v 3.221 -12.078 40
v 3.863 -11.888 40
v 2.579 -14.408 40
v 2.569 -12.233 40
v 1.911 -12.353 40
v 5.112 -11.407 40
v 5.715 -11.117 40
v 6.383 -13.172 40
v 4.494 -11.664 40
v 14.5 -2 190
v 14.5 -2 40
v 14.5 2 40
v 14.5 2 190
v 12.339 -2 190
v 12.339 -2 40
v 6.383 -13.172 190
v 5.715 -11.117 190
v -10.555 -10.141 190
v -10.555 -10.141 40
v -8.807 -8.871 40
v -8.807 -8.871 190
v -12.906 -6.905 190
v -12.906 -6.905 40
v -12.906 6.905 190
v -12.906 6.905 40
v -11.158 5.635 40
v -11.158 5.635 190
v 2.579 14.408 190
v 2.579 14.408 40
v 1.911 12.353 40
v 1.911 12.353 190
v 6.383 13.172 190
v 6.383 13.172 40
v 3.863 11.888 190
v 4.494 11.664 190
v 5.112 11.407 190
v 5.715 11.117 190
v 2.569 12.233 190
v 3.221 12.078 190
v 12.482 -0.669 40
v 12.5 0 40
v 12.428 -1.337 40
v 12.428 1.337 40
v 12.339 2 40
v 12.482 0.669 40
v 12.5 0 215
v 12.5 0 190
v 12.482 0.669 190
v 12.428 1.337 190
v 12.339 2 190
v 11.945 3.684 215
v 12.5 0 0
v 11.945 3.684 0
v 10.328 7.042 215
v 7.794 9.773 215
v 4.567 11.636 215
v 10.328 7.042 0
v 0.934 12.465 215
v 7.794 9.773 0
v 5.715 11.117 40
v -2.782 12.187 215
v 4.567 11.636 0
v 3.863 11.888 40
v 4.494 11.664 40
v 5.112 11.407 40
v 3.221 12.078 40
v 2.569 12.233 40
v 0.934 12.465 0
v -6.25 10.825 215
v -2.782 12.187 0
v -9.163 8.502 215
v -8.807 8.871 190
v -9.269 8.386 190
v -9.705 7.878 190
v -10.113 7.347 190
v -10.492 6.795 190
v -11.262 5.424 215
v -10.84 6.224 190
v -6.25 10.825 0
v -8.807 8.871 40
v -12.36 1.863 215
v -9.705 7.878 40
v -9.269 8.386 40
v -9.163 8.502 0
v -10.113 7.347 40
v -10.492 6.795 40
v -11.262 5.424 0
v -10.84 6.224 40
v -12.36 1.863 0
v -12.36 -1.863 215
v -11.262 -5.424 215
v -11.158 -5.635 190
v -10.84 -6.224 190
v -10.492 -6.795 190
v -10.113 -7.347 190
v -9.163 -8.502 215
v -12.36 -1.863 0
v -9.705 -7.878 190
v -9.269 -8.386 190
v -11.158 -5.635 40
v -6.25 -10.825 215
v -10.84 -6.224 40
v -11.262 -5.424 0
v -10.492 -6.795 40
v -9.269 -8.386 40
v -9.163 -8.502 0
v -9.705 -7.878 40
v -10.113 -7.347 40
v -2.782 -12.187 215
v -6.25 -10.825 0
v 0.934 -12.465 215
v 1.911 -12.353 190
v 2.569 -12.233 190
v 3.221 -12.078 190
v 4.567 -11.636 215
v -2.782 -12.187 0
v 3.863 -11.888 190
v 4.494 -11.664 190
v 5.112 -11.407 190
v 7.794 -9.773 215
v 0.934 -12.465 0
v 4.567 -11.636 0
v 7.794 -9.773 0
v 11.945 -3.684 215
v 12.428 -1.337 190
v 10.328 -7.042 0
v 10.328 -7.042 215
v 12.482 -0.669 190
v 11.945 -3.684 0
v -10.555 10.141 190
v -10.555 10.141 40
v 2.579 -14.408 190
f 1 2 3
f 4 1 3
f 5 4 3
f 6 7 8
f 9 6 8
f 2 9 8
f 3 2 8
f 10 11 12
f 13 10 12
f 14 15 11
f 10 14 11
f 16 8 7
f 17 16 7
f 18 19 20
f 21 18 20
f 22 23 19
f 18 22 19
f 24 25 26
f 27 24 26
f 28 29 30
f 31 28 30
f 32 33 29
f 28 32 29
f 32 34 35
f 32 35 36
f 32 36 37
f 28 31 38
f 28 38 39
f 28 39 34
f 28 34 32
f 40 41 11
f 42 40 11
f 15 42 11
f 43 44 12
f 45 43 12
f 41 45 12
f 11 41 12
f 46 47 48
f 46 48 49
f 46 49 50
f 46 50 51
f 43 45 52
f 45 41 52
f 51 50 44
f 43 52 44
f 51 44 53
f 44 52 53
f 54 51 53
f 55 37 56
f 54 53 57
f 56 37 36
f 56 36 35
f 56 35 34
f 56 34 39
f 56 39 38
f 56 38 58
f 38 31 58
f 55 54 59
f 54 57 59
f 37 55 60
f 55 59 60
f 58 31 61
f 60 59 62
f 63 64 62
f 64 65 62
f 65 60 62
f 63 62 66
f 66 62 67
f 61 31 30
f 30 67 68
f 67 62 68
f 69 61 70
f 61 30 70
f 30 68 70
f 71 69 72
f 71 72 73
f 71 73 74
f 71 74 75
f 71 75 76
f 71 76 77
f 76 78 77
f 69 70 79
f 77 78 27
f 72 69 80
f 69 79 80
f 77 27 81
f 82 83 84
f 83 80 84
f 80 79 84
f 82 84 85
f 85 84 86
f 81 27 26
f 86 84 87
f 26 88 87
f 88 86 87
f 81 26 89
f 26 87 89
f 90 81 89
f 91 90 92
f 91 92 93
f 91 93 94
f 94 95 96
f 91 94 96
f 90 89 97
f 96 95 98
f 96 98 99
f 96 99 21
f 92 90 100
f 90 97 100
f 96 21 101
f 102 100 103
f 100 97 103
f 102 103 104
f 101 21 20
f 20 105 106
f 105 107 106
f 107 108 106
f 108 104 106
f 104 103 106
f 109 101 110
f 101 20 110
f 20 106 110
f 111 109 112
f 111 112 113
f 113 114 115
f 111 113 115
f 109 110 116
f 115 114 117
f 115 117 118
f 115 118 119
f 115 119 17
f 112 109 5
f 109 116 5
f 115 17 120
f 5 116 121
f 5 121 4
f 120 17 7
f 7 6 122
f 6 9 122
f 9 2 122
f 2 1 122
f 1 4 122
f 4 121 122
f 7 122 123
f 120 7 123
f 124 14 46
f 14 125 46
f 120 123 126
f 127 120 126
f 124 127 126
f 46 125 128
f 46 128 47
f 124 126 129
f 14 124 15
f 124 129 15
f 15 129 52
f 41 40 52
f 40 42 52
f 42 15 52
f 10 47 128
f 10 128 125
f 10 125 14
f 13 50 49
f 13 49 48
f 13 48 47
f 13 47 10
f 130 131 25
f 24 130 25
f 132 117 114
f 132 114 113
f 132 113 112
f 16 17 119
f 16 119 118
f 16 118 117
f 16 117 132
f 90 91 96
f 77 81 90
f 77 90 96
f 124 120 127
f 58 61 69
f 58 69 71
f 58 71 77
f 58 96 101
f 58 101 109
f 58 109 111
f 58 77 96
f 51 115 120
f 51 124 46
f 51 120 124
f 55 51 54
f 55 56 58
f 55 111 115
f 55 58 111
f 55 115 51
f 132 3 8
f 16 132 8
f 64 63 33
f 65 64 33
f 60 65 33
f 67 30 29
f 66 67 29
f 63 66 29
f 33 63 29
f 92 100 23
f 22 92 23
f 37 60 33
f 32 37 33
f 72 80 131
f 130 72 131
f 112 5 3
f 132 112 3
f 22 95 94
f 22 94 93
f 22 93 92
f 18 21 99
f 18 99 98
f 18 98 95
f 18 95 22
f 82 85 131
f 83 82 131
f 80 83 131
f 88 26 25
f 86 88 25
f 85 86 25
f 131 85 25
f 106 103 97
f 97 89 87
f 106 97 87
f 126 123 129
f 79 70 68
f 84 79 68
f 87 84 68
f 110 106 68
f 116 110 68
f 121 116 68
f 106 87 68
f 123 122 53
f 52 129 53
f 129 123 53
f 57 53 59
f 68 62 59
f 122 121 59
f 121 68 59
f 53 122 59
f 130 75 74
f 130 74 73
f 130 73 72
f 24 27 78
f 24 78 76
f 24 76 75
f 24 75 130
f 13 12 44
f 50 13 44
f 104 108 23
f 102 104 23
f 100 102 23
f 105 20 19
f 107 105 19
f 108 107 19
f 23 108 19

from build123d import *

# Parameters (mm, degrees)
SKETCH1_R           = 12.5
BOSS_EXTRUDE1_DEPTH = 215
BOSS_EXTRUDE2_START = 40
SKETCH1_3_W         = 4
SKETCH1_3_H         = 4
BOSS_EXTRUDE2_DEPTH = 150
CIRPATTERN1_COUNT   = 5


with BuildPart() as part:
    # Sketch1 → Boss-Extrude1 (new body)
    with BuildSketch(Plane.XY):
        Circle(SKETCH1_R)
    extrude(amount=BOSS_EXTRUDE1_DEPTH)

    # Sketch1<3> → Boss-Extrude2 (add)
    with BuildSketch(Plane.XY.offset(BOSS_EXTRUDE2_START)):
        with Locations((12.5, 0)):
            Rectangle(SKETCH1_3_W, SKETCH1_3_H)
    boss_extrude2 = extrude(amount=BOSS_EXTRUDE2_DEPTH)

    # CirPattern1: Boss-Extrude2 ×5 about axis
    cirpattern1_axis = Axis((0, 0, 215), (0, 0, -1))
    for i in range(1, CIRPATTERN1_COUNT):
        add(boss_extrude2.rotate(cirpattern1_axis, i * 360 / CIRPATTERN1_COUNT))


solid = part.part
